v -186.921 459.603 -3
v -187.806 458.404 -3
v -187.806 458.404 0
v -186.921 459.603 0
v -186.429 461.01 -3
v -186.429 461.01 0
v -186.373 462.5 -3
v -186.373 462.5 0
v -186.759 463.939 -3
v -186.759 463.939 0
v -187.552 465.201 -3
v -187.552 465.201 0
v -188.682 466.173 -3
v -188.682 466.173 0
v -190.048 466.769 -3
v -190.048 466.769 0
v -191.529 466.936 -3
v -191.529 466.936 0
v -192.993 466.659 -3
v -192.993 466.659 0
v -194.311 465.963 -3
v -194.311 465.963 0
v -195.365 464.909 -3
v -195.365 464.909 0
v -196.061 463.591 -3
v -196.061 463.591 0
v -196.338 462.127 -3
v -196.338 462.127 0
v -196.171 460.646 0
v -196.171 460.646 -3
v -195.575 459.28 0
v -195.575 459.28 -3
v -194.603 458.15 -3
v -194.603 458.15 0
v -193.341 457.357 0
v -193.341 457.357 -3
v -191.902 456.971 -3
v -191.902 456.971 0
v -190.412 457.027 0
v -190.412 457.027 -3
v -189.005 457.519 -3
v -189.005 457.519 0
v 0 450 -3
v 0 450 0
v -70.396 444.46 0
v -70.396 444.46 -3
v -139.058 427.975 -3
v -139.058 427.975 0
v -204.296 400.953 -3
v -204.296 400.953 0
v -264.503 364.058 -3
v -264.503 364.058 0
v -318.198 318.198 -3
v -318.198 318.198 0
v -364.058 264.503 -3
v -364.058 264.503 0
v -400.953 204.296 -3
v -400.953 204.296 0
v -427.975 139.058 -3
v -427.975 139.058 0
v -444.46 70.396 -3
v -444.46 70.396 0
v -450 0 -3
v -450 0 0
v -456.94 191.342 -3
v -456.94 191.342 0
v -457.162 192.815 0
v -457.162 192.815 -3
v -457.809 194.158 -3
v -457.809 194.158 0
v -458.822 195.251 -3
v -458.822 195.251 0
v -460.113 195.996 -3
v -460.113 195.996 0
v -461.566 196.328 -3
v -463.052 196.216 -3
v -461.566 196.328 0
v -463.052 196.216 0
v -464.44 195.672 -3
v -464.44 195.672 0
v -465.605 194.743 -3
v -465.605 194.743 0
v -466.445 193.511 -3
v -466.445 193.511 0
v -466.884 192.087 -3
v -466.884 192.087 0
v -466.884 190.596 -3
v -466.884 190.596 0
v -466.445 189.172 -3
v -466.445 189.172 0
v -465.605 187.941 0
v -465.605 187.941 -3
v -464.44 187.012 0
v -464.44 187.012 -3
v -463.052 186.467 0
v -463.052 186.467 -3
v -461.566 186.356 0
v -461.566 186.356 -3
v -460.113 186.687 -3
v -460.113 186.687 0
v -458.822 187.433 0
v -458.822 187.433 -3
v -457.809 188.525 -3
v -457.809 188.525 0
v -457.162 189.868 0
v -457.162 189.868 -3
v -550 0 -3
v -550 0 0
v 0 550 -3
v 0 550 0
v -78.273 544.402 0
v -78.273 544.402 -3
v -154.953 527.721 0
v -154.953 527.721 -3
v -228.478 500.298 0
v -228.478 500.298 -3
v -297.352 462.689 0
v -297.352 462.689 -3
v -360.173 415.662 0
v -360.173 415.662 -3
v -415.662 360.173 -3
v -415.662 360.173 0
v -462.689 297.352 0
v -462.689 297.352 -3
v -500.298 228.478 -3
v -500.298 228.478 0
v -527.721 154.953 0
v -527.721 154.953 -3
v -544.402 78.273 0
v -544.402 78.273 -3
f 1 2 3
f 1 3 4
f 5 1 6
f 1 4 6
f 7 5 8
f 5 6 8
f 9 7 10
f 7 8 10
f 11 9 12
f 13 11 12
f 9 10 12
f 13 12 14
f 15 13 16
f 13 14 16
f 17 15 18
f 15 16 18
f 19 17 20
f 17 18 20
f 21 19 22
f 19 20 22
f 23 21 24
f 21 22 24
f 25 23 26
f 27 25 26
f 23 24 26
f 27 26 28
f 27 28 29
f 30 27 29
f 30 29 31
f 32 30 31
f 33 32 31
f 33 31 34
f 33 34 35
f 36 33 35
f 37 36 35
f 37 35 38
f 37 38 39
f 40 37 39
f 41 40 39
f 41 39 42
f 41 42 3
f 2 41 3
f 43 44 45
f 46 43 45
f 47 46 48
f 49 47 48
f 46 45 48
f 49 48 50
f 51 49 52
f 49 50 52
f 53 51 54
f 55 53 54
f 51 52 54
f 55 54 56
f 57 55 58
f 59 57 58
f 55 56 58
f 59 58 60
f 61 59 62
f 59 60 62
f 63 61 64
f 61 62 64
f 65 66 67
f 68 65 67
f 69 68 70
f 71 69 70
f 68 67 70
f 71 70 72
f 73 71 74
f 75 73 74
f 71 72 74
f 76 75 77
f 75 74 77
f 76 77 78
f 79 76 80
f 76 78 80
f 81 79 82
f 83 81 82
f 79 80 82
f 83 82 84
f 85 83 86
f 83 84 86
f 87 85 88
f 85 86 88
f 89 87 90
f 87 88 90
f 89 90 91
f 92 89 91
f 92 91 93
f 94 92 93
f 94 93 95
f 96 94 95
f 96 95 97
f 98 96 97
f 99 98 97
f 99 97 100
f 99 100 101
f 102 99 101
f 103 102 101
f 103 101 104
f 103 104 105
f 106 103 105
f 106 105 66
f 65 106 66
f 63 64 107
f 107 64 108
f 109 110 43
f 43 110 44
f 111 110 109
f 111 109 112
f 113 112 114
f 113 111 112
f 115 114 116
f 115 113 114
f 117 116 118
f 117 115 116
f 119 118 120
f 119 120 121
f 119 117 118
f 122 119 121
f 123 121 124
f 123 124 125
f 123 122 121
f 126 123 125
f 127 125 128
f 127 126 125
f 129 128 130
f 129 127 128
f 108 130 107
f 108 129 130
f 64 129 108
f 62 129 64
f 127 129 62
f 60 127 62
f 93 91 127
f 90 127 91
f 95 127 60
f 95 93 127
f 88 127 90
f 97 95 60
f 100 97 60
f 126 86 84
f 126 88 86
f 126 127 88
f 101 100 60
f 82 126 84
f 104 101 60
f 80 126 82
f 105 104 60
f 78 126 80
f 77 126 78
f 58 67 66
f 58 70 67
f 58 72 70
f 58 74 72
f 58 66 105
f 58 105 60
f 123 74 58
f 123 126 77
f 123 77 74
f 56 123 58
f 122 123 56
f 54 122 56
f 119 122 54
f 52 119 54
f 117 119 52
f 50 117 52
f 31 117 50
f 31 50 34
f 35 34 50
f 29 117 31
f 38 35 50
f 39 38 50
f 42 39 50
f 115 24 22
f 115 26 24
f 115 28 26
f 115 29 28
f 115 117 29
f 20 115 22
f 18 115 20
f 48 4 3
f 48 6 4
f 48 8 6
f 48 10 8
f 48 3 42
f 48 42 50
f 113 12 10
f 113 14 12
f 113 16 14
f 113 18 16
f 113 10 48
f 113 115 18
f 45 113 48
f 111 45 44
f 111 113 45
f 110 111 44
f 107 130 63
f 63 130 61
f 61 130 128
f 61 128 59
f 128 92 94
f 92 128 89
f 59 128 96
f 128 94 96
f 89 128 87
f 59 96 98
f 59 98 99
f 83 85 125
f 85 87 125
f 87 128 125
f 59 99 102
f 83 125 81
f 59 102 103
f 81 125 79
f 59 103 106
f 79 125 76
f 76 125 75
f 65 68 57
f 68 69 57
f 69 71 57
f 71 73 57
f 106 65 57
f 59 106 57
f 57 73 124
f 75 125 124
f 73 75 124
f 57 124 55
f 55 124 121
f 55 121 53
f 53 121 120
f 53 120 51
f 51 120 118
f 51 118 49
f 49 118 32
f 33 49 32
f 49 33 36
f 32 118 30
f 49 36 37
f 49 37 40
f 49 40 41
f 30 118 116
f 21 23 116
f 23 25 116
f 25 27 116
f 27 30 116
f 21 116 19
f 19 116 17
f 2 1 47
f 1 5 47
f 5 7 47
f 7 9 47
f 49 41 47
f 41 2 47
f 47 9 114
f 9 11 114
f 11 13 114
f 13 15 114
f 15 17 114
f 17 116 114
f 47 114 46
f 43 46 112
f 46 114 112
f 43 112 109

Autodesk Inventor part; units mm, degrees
ref_plane "YZ Plane" through (0, 0, 0) normal (1, 0, 0) x (0, 1, 0)
ref_plane "XZ Plane" through (0, 0, 0) normal (0, 1, 0) x (-1, 0, 0)
ref_plane "XY Plane" through (0, 0, 0) normal (0, 0, 1) x (1, 0, 0)
sketch "Sketch1" plane through (0, 0, 0) normal (0, 0, 1) x (1, 0, 0)
  arc A0 (0, 550) -> (-550, 0) centre (0, 0) ccw
  arc A1 (0, 450) -> (-450, 0) centre (0, 0) ccw
  line L0 (0, 550) -> (0, 450)
  line L1 (-450, 0) -> (-550, 0)
  point P0 (-500, 0)
  point P1 (0, 500)
  dimension "d0" = 1100
  dimension "d1" = 900
extrude "Plate1" add sketch "Sketch1" against normal blind 3
sketch "Sketch2" plane through (0, 0, 0) normal (0, 0, 1) x (1, 0, 0)
  line L0 (-550, 0) -> (-450, 0) projected
  arc A0 (0, 550) -> (-550, 0) centre (0, 0) ccw projected
  circle A1 centre (-461.9398, 191.3417) radius 5
  arc A2 (0, 450) -> (-450, 0) centre (0, 0) ccw projected
  line L1 (-415.7458, 172.2075) -> (-508.1337, 210.4759) construction
  point P0 (-461.9398, 191.3417)
  dimension "d4" = 10
  dimension "d5" = 22.5
extrude "Cut1" cut sketch "Sketch2" against normal through all
pattern_circular "Circular Pattern1" count 2 over 45 about axis through (0, 0, 0) along (0, 0, -1) of "Cut1"
equation "\"d0\" = Диаметр_вн"
equation "\"d1\" = d0 - 2 * Ширина_кольца"
equation "\"d4\" = Диаметр_отв"
equation "\"d6\" = Thickness"
equation "\"d2\" = Thickness"
equation "\"BendReliefWidth\" = Thickness"
equation "\"BendReliefDepth\" = 0.5 * Thickness"
equation "\"CornerReliefSize\" = 4 * Thickness"
equation "\"MinimumRemnant\" = 2 * Thickness"
equation "\"TransitionRadius\" = BendRadius"
equation "\"JacobiRadiusSize\" = BendRadius"
equation "\"GapSize\" = Thickness"
equation "\"Диаметр_вн\" = 1100"
equation "\"Ширина_кольца\" = 100"
equation "\"Диаметр_отв\" = 10"
equation "\"Thickness\" = 3"
equation "\"BendRadius\" = 5"
properties part number "BSH 501 segment" material "Stainless Steel"
